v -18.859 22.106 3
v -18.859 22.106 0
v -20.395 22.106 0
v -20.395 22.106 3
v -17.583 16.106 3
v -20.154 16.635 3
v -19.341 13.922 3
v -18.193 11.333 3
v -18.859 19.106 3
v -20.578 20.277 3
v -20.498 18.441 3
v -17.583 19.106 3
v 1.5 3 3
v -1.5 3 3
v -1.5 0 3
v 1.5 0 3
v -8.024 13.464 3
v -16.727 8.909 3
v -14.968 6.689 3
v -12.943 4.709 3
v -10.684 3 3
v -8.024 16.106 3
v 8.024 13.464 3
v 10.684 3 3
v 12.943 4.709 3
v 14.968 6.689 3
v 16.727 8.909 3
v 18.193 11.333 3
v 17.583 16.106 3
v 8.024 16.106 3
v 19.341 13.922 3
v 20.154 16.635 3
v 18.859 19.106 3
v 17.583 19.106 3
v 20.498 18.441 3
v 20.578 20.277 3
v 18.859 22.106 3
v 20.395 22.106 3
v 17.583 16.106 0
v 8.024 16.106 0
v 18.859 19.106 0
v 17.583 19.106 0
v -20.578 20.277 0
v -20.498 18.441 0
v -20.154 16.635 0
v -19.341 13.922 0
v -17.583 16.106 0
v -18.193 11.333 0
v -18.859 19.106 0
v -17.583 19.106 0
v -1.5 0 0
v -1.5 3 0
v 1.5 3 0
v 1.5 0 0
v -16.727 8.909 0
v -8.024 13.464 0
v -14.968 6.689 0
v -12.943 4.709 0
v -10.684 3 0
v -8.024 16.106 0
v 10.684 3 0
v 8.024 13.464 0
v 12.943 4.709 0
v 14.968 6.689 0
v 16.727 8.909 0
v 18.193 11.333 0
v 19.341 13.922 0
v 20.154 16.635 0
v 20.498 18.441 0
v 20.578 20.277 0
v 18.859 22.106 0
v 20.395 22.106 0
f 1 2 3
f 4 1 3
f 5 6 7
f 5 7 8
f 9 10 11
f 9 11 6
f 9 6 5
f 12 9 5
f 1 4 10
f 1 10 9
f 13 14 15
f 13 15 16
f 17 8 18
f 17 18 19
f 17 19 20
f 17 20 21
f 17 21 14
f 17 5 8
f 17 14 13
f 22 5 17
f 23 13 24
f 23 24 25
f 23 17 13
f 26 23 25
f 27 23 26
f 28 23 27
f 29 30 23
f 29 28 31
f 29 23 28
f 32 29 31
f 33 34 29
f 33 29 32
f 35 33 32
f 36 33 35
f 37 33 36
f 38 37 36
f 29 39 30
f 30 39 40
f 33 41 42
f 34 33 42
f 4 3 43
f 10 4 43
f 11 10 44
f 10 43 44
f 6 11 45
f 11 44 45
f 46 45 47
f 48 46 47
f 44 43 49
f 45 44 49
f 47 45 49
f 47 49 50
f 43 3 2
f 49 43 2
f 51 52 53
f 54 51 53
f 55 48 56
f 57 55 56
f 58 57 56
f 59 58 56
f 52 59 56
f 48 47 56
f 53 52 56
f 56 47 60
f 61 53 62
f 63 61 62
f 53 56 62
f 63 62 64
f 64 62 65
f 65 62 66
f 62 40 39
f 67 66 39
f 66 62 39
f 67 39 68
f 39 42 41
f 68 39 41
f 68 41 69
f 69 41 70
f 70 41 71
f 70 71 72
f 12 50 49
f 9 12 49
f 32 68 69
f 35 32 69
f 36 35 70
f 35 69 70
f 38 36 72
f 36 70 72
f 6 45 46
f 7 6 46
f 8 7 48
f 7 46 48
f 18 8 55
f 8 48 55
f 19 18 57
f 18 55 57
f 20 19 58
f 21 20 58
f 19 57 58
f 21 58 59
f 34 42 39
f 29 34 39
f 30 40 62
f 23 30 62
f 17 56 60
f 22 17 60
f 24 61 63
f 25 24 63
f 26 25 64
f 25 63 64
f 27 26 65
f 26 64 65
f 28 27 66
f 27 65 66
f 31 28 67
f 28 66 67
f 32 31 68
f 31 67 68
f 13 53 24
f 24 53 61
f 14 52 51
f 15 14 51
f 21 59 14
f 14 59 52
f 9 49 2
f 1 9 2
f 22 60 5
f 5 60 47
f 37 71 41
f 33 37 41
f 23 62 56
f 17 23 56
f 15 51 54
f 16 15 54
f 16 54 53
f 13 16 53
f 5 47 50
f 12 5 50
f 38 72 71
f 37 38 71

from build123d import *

# Parameters (mm, degrees)
BOSS_EXTRUDE1_DEPTH = 3


with BuildPart() as part:
    # Sketch1 → Boss-Extrude1 (new body)
    with BuildSketch(Plane.XY):
        with BuildLine():
            Line((8.024, 16.106), (8.024, 13.464))
            Line((8.024, 13.464), (-8.024, 13.464))
            Line((-8.024, 13.464), (-8.024, 16.106))
            Line((-8.024, 16.106), (-17.583, 16.106))
            Line((-17.583, 16.106), (-17.583, 19.106))
            Line((-17.583, 19.106), (-18.859, 19.106))
            Line((-18.859, 19.106), (-18.859, 22.106))
            Line((-18.859, 22.106), (-20.394542528, 22.106))
            ThreePointArc((-20.394542528, 22.106), (-20.571042392, 19.357451914), (-20.154, 16.635))
            ThreePointArc((-20.154, 16.635), (-16.727003231, 8.90904451), (-10.684, 3))
            Line((-10.684, 3), (-1.5, 3))
            Line((-1.5, 3), (-1.5, 0))
            Line((-1.5, 0), (1.5, 0))
            Line((1.5, 0), (1.5, 3))
            Line((1.5, 3), (10.684, 3))
            ThreePointArc((10.684, 3), (16.727003231, 8.90904451), (20.154, 16.635))
            ThreePointArc((20.154, 16.635), (20.571042392, 19.357451914), (20.394542528, 22.106))
            Line((20.394542528, 22.106), (18.859, 22.106))
            Line((18.859, 22.106), (18.859, 19.106))
            Line((18.859, 19.106), (17.583, 19.106))
            Line((17.583, 19.106), (17.583, 16.106))
            Line((17.583, 16.106), (8.024, 16.106))
        make_face()
    extrude(amount=BOSS_EXTRUDE1_DEPTH)


solid = part.part
